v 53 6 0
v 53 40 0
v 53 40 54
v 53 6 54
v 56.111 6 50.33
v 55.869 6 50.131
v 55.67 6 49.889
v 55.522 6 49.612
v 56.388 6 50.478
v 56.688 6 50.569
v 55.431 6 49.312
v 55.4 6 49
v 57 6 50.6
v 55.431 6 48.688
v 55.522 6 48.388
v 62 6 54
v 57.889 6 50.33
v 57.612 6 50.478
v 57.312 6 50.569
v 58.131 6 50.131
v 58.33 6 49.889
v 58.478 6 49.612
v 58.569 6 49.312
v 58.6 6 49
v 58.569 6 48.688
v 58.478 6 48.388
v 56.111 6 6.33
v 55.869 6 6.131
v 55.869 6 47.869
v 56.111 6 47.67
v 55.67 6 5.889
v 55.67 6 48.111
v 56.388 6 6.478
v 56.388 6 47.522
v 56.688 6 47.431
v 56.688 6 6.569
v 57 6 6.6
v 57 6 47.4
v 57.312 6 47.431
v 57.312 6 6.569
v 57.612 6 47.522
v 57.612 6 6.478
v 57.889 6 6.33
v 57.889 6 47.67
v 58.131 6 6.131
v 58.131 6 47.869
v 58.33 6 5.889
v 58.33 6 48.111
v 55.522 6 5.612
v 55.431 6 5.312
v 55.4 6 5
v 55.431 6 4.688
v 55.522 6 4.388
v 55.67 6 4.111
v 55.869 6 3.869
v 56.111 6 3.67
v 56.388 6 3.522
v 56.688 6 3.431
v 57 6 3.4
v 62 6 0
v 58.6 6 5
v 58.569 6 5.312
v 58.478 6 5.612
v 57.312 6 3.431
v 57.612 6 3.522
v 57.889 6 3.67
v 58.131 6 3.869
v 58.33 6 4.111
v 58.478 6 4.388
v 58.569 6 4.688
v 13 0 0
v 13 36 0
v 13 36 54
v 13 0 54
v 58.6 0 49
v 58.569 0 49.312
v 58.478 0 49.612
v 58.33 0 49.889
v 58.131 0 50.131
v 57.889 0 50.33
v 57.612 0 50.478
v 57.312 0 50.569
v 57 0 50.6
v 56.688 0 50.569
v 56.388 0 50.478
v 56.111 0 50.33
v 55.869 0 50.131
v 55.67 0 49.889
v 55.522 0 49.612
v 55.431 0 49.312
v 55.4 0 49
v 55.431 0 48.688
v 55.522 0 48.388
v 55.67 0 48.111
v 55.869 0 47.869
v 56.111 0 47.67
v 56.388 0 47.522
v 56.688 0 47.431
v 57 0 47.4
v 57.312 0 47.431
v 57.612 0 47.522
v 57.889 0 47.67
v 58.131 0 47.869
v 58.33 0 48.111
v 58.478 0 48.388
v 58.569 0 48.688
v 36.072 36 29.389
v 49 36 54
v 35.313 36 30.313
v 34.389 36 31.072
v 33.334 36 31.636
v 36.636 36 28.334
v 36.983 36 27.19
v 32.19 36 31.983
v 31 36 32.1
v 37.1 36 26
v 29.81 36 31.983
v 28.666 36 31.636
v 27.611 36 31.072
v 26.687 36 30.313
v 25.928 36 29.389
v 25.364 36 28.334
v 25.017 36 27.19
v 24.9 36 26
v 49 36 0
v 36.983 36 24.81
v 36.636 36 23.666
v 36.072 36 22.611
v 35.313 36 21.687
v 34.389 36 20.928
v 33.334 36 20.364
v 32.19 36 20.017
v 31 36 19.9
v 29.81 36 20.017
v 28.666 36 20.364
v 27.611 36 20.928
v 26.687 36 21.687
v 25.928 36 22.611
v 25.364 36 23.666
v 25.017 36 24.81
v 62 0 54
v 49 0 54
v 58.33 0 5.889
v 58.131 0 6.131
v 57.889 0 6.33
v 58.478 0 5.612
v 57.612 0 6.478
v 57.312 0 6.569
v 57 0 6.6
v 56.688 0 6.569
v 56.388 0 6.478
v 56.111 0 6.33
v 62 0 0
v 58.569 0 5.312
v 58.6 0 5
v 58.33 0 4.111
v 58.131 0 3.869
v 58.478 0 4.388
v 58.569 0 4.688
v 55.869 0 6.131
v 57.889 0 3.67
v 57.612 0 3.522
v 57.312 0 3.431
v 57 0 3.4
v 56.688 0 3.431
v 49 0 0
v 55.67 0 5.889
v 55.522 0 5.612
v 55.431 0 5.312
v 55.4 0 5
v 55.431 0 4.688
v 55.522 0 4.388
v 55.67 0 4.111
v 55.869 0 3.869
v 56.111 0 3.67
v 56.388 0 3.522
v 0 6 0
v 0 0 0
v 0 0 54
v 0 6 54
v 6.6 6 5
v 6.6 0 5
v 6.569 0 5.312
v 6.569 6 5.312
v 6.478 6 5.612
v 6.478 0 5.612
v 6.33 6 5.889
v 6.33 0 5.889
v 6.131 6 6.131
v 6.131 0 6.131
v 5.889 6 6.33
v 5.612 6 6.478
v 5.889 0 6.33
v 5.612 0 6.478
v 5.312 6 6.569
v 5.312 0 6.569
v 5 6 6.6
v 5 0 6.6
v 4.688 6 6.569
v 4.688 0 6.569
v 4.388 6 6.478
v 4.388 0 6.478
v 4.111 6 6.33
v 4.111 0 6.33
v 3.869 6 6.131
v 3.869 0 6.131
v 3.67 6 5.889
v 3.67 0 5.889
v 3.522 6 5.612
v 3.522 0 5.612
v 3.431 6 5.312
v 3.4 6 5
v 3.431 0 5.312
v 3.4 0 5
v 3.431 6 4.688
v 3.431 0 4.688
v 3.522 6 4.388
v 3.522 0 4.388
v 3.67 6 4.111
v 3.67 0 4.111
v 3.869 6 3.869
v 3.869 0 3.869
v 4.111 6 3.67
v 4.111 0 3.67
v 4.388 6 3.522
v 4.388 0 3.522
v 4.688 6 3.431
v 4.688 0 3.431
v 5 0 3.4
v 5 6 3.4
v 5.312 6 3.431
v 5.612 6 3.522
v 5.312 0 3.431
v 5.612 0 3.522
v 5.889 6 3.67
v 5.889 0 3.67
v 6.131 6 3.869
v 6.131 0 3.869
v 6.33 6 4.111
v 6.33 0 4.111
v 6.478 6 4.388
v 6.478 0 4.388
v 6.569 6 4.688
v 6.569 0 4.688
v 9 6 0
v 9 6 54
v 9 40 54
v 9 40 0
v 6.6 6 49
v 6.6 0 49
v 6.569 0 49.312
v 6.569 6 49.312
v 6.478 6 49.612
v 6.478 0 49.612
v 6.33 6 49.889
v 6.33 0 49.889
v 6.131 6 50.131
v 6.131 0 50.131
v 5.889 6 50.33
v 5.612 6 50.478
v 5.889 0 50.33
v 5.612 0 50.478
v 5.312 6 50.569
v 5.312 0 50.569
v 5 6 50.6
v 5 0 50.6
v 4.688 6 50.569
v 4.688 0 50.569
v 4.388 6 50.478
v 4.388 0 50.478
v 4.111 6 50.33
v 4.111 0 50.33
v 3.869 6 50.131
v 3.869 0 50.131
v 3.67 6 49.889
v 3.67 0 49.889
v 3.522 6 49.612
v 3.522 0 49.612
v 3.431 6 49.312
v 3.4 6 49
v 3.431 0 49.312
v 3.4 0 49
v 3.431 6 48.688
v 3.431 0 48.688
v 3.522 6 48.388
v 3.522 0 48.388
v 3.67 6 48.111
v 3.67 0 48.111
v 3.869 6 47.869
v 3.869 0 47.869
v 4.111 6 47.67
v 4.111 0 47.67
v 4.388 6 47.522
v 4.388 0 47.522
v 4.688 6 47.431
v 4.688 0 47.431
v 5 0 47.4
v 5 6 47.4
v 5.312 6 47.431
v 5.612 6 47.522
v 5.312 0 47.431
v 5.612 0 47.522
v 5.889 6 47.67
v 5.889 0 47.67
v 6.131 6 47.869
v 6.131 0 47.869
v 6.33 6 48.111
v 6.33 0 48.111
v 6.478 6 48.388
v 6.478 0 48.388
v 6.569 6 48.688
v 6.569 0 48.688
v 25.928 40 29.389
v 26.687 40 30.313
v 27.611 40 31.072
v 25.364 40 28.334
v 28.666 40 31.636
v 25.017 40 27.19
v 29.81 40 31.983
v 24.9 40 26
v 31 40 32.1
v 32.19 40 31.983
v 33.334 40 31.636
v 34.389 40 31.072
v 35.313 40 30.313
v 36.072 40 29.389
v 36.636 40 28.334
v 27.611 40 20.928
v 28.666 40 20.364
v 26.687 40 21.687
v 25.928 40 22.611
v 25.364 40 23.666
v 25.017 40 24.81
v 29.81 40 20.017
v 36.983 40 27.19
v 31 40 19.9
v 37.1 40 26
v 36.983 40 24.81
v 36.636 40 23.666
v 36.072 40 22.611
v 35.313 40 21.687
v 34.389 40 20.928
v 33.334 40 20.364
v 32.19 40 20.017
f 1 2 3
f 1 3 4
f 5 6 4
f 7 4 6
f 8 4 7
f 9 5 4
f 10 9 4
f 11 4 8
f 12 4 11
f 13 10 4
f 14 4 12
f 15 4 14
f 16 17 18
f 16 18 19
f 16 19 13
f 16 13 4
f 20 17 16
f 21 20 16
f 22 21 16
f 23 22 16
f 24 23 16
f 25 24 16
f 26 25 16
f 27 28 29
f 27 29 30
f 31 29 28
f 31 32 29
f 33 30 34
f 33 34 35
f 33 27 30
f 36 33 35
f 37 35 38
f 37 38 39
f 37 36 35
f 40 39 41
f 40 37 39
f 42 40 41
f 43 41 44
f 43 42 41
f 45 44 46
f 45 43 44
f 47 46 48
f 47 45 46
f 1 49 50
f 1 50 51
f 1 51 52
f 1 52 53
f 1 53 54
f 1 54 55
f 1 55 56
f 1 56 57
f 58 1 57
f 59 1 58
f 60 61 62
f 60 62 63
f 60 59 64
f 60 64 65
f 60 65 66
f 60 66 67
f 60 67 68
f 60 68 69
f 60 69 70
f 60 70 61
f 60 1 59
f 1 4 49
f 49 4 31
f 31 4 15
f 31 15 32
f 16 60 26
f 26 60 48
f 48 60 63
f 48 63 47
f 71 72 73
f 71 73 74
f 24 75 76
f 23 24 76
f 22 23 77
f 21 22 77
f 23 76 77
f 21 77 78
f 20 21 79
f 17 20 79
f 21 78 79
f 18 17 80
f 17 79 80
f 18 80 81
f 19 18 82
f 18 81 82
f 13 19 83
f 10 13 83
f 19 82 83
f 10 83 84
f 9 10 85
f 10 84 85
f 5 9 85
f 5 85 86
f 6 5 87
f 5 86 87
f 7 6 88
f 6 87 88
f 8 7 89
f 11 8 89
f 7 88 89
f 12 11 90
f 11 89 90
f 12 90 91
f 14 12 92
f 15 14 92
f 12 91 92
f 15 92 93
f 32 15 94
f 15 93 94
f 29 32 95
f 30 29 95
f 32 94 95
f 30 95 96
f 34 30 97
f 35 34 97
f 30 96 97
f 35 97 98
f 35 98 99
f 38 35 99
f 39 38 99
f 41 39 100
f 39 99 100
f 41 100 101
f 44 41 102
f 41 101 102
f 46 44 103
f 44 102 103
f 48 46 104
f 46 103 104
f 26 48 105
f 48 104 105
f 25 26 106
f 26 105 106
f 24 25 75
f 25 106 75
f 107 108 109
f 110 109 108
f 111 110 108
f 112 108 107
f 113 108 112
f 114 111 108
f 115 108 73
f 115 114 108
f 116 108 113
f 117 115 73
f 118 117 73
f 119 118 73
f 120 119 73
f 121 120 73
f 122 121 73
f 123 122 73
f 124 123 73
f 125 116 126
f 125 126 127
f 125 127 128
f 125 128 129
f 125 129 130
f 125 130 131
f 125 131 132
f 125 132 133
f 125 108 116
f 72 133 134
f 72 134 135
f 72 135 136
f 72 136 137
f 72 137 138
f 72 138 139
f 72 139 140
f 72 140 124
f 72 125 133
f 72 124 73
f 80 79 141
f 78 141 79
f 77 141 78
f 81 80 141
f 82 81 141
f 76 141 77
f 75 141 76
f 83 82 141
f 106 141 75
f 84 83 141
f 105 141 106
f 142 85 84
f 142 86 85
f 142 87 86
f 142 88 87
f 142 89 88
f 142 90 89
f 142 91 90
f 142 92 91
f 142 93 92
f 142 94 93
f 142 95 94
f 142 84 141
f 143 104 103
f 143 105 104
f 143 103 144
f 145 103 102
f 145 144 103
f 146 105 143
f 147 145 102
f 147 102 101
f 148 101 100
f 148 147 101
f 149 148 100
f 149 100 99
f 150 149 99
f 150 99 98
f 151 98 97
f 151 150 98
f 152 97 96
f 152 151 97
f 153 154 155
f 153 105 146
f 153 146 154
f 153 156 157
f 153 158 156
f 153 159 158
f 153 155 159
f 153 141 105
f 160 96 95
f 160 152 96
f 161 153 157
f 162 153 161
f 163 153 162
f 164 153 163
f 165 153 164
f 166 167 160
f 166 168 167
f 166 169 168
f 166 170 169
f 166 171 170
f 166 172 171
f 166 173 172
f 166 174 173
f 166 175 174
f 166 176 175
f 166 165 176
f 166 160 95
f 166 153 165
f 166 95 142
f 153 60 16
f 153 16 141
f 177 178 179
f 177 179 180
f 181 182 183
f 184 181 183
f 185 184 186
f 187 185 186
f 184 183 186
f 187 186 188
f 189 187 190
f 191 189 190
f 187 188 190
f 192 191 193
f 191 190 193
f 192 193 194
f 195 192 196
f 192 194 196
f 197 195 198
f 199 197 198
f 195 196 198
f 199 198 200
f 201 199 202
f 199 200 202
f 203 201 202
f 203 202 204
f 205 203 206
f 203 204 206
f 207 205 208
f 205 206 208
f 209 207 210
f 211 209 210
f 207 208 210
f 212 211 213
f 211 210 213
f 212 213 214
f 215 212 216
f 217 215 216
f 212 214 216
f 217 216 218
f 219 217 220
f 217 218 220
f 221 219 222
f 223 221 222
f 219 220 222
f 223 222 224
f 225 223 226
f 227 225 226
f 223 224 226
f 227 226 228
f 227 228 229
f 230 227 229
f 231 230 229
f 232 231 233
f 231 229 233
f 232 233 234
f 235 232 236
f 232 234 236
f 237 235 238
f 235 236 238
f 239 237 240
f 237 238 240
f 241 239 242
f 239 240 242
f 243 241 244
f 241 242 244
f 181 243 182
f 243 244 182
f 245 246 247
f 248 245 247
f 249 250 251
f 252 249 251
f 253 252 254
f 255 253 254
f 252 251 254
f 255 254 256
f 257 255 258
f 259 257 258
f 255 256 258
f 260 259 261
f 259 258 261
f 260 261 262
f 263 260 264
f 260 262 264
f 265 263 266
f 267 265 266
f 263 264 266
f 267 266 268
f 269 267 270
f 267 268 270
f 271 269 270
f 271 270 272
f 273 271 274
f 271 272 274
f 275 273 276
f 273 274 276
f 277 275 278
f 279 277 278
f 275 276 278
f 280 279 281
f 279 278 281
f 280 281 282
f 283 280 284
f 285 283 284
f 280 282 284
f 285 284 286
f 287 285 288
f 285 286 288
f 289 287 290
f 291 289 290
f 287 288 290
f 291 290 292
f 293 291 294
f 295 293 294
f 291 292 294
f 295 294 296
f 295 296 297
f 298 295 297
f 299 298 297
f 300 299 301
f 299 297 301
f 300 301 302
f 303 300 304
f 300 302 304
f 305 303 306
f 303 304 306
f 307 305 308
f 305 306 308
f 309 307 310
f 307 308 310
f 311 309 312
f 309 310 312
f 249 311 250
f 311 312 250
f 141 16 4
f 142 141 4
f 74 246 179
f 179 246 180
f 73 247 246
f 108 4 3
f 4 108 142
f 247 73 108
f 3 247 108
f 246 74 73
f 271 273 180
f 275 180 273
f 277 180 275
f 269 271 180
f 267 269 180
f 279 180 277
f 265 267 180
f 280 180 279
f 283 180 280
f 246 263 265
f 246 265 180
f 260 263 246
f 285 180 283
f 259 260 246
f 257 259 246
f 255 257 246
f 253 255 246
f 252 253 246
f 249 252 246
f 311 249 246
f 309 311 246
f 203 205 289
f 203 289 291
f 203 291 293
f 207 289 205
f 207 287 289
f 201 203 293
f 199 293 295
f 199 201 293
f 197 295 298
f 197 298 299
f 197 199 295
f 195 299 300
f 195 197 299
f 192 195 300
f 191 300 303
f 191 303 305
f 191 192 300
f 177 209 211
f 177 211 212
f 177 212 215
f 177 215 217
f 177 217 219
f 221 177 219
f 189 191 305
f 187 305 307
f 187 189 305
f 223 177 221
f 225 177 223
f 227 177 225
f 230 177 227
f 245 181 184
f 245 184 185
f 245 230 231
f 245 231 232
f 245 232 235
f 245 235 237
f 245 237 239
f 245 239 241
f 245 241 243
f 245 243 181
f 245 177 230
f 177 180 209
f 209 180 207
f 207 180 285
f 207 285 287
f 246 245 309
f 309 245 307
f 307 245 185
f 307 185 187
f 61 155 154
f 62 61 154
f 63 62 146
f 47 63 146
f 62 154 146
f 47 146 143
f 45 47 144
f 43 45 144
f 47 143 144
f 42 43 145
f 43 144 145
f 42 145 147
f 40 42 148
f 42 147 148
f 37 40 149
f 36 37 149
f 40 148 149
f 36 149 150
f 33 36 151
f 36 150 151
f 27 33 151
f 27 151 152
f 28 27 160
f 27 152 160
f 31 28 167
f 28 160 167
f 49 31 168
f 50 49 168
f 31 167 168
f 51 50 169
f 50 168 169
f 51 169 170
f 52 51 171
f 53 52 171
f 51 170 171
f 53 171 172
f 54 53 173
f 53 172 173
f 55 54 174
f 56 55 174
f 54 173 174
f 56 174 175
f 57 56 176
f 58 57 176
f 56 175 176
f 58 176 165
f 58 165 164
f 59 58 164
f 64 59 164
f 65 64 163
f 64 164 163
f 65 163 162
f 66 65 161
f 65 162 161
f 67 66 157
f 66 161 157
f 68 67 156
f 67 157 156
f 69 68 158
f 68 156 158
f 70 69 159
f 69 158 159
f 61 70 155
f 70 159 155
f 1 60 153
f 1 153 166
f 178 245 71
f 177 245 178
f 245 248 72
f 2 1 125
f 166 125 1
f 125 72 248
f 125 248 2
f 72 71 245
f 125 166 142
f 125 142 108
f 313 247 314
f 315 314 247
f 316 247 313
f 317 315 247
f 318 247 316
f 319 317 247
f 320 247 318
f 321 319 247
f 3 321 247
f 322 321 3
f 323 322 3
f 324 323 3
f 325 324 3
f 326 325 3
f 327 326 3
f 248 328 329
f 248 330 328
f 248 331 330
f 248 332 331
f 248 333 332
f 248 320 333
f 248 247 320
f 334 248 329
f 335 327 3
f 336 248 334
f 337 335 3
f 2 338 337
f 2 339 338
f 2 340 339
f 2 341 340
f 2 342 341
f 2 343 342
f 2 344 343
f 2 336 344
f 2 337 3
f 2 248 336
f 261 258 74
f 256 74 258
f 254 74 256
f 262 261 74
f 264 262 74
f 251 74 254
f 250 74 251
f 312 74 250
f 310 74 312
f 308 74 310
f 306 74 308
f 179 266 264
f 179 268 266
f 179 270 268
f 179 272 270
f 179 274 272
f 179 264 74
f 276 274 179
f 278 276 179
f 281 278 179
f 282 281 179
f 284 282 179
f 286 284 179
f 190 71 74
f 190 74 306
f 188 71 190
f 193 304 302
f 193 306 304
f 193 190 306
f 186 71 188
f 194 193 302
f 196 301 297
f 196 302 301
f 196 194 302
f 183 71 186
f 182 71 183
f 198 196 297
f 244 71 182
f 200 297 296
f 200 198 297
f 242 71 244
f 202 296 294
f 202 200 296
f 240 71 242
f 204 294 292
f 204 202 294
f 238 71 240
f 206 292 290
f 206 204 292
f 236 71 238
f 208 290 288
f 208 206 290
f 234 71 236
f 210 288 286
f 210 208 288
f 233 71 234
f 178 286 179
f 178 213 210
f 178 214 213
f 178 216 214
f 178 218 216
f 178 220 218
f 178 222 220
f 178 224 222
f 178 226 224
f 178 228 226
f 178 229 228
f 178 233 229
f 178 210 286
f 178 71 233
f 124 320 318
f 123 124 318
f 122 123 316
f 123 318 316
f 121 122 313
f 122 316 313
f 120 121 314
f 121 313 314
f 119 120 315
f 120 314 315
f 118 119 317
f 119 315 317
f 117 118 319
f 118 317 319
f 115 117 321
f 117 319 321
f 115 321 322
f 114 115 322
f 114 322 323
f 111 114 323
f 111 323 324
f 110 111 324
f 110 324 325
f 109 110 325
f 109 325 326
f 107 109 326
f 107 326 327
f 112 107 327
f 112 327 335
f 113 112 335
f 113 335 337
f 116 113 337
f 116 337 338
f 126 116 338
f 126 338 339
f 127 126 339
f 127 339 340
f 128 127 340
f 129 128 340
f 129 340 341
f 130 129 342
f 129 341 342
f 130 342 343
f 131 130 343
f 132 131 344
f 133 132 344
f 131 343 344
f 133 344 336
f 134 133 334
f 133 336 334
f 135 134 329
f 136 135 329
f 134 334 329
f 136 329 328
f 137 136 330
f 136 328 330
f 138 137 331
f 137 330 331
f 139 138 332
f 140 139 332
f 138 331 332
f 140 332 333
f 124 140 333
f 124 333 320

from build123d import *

# Parameters (mm, degrees)
PAD_DEPTH       = 54
SKETCH001_R     = 1.6
POCKET_DEPTH    = 6
SKETCH002_R     = 6.1
POCKET001_DEPTH = 5


with BuildPart() as part:
    # Sketch → Pad (new body)
    with BuildSketch(Plane.XY):
        Polygon((0, 0), (0, 6), (9, 6), (9, 40), (53, 40), (53, 6), (62, 6), (62, 0), (49, 0), (49, 36), (13, 36), (13, 0), align=None)
    extrude(amount=PAD_DEPTH)

    # Sketch001 (on Face8 of Pad) → Pocket (cut)
    with BuildSketch(Plane.XZ):
        with Locations((5, 5)):
            Circle(SKETCH001_R)
        with Locations((57, 5)):
            Circle(SKETCH001_R)
        with Locations((57, 49)):
            Circle(SKETCH001_R)
        with Locations((5, 49)):
            Circle(SKETCH001_R)
    extrude(amount=-POCKET_DEPTH, mode=Mode.SUBTRACT)

    # Sketch002 (on Face10 of Pocket) → Pocket001 (cut)
    with BuildSketch(Plane(origin=(0, 40, 0), x_dir=(-1, 0, 0), z_dir=(0, 1, 0))):
        with Locations((-31, 26)):
            Circle(SKETCH002_R)
    extrude(amount=-POCKET001_DEPTH, mode=Mode.SUBTRACT)


solid = part.part
